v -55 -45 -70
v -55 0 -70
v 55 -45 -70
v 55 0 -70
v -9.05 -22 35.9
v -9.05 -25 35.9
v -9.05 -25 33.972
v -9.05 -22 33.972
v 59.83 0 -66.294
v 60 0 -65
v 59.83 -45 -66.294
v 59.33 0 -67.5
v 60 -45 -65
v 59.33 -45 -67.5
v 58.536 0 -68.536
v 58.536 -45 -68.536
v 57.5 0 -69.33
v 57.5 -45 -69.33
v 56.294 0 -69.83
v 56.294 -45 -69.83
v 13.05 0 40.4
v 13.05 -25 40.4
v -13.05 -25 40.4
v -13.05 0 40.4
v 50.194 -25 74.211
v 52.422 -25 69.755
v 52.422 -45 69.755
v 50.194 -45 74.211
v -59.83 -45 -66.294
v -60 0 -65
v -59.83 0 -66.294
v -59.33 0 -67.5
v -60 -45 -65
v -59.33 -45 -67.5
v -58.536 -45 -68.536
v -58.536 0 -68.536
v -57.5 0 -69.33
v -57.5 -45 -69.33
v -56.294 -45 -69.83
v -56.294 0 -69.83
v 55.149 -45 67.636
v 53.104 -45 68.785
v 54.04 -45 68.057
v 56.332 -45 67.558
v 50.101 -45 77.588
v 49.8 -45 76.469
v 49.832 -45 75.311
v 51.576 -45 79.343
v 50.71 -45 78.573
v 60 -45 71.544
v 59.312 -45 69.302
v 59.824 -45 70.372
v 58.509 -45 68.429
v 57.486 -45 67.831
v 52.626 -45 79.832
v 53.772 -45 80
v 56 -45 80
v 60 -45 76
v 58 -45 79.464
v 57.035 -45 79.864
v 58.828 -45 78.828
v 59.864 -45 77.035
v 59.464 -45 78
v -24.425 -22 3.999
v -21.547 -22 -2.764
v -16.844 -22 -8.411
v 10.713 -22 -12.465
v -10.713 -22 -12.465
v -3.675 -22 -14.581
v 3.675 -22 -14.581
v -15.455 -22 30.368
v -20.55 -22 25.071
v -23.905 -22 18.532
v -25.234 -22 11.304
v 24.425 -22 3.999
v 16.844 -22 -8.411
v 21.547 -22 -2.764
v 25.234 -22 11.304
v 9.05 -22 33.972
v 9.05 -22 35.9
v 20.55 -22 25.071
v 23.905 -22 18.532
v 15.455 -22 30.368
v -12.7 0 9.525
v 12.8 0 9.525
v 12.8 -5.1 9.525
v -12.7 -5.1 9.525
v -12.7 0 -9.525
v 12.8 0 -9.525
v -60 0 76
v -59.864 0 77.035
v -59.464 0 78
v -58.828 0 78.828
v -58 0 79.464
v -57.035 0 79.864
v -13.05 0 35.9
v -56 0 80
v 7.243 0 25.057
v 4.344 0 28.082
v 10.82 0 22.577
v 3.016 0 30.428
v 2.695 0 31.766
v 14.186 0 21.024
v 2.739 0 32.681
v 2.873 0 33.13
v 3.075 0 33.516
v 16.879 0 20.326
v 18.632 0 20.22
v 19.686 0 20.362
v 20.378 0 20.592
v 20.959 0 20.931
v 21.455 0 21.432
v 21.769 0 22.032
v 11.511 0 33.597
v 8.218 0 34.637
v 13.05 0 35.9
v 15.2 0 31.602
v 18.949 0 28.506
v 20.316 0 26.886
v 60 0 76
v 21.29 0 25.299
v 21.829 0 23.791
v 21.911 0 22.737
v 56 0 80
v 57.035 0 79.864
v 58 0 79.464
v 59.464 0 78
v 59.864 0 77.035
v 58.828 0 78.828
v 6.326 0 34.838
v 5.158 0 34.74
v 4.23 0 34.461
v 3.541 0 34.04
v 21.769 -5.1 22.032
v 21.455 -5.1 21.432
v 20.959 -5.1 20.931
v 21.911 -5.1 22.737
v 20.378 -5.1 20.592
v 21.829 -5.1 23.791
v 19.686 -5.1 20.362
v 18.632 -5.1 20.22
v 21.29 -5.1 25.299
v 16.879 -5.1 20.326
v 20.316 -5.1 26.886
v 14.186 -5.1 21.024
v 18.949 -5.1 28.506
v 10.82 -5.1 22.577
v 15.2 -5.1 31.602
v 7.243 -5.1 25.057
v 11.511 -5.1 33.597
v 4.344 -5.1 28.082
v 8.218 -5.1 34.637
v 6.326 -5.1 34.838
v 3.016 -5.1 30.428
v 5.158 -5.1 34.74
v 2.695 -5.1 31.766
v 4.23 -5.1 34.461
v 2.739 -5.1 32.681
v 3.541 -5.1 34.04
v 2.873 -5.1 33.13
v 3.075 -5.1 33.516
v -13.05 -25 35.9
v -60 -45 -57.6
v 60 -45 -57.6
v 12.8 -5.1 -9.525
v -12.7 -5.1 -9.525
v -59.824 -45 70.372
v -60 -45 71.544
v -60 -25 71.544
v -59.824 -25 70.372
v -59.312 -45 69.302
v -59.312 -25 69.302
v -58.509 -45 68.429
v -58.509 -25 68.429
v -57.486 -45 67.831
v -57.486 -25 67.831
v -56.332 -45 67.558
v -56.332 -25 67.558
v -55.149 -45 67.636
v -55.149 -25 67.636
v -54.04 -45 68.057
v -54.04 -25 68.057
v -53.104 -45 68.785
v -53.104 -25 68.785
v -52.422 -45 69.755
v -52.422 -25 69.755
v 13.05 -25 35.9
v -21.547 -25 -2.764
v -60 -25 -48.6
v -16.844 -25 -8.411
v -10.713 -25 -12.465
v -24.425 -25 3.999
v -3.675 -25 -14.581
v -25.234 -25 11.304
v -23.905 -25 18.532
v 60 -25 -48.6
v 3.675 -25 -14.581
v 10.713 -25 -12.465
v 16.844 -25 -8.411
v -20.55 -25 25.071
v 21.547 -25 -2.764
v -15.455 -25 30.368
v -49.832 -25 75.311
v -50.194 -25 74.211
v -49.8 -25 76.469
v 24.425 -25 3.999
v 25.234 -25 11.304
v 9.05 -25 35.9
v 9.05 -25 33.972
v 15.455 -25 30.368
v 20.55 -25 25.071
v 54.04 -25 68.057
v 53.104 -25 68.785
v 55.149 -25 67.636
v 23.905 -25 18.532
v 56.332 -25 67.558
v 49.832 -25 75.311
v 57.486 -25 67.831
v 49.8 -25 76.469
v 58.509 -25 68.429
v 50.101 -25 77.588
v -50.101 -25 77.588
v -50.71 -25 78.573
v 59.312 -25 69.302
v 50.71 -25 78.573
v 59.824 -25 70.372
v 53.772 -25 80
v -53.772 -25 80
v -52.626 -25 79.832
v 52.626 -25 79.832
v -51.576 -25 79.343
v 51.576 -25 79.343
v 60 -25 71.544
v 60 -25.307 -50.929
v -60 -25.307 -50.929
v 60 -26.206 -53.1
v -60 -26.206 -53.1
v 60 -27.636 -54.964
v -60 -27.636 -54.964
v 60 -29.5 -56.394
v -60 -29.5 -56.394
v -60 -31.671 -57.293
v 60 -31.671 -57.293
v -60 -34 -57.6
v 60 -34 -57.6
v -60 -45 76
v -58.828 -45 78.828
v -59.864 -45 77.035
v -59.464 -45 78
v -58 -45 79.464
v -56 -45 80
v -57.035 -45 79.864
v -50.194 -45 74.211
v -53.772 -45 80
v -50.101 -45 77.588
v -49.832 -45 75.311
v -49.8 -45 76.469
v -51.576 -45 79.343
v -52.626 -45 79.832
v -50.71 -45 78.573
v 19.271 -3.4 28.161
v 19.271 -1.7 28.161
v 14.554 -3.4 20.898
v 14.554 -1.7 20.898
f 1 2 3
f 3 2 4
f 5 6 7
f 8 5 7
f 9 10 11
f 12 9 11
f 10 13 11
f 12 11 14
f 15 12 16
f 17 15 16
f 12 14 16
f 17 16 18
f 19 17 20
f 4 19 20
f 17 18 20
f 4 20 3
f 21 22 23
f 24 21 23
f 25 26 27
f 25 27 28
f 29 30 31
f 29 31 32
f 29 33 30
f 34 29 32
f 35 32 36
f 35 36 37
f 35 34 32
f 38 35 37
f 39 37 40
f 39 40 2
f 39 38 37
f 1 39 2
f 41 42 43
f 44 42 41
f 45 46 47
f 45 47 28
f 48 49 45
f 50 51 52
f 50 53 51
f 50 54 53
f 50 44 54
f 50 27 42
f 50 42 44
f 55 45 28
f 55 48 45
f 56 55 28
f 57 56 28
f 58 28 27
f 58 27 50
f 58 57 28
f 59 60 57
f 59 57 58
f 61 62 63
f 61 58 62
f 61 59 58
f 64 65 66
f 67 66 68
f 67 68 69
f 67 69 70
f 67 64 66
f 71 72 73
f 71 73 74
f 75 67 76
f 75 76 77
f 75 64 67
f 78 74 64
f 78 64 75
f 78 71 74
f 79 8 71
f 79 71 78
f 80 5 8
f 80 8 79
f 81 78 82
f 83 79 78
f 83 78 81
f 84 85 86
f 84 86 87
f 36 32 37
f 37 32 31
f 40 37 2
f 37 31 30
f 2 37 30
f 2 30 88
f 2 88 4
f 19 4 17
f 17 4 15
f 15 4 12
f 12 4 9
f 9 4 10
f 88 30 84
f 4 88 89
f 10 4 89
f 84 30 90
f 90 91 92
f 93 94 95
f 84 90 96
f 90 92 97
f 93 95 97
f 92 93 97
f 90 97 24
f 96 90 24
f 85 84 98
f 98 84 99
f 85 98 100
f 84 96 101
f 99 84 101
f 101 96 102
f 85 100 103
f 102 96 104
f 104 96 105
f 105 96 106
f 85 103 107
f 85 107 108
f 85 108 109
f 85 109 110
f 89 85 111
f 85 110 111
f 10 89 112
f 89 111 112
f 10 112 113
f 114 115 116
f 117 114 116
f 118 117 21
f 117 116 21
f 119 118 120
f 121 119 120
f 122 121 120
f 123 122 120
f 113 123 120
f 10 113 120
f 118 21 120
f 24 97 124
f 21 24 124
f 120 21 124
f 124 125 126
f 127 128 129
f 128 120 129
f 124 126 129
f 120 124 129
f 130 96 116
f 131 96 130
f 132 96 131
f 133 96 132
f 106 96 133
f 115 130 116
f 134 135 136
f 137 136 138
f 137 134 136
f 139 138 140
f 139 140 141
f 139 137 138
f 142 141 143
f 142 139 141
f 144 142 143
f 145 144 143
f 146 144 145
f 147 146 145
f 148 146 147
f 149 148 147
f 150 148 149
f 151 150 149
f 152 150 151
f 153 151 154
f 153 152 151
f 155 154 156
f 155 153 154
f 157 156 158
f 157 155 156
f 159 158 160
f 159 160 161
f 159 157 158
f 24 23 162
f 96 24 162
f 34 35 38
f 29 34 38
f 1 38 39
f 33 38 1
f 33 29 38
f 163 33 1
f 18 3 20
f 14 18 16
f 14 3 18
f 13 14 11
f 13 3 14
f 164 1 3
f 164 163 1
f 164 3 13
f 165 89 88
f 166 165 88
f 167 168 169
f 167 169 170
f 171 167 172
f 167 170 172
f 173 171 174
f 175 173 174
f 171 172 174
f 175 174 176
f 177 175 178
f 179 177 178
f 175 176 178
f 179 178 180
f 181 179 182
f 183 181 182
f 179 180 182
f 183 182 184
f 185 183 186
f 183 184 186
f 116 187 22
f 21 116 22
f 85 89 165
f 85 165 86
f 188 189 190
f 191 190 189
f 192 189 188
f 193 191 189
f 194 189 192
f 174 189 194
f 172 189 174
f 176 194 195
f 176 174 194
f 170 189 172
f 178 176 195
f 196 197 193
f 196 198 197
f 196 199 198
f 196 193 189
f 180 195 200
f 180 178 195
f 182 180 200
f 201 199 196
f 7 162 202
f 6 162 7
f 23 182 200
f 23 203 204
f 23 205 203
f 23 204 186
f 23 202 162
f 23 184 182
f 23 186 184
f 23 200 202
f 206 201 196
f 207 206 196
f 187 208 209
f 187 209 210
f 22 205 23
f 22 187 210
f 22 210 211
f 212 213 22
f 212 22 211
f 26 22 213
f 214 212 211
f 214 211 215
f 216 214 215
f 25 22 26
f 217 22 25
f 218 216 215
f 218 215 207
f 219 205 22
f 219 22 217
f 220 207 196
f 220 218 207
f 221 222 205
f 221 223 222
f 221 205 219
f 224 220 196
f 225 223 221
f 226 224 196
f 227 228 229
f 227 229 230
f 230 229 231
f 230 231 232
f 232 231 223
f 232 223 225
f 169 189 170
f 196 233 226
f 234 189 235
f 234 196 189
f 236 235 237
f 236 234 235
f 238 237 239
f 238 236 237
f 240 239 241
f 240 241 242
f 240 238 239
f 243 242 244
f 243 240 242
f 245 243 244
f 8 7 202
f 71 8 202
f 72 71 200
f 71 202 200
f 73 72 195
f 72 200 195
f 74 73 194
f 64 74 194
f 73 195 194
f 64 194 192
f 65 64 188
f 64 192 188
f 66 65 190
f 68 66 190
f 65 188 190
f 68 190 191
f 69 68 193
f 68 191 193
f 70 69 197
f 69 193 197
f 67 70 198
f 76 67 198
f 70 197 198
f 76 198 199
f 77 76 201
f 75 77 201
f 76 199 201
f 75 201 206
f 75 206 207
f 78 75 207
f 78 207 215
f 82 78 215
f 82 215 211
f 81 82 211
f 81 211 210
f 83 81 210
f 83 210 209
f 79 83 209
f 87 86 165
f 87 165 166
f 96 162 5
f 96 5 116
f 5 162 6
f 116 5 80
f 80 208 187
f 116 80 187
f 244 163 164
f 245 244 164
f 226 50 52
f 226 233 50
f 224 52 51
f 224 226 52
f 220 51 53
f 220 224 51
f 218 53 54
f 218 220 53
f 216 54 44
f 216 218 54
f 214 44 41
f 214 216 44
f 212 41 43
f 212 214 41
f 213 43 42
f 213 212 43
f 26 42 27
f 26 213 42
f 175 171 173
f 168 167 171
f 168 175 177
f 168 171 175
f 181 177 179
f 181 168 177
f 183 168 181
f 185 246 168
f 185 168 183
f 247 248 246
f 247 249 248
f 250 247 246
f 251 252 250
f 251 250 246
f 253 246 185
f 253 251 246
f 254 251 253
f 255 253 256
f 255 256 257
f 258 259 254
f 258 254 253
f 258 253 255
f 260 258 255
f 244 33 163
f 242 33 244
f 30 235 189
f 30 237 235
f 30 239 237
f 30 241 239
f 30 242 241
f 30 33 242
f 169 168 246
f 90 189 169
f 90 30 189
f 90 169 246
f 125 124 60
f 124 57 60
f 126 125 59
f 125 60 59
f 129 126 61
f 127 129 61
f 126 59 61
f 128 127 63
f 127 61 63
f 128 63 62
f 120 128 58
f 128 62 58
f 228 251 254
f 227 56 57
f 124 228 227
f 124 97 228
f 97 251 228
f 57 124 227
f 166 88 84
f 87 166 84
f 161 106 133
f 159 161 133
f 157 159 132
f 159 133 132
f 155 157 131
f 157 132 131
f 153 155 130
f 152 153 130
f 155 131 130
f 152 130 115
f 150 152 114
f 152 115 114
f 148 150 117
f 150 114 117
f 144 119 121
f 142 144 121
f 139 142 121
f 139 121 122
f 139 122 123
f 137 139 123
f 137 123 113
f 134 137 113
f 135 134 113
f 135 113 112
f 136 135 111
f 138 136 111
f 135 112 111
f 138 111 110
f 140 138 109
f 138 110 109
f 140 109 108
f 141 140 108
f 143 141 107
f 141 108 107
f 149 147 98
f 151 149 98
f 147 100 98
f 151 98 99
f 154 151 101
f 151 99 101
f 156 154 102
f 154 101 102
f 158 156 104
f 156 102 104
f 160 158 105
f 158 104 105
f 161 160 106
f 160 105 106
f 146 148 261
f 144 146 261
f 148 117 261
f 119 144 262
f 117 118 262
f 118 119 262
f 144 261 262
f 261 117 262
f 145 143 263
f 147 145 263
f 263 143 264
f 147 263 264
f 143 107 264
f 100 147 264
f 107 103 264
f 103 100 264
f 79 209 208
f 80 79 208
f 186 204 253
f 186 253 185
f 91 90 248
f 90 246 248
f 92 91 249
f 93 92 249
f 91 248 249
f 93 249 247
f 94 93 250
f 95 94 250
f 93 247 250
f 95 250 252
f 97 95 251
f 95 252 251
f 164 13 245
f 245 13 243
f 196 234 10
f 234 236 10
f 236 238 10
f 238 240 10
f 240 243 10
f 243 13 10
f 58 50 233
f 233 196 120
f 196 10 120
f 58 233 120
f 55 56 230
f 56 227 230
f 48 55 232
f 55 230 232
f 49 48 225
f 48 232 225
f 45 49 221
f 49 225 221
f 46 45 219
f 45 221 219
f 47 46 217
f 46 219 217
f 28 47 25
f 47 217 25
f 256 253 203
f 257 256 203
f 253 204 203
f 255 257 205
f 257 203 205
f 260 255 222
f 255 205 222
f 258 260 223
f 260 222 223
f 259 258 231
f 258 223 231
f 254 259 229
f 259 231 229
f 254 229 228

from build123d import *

# Parameters (mm, degrees)
F0_W      = 120
F0_H      = 150
F1_DEPTH  = 45
F3_DEPTH  = 20
F4_R      = 9
F5_R      = 4
F6_R      = 5
F7_W      = 25.5
F7_H      = 19.05
F8_DEPTH  = 5.1
F10_DEPTH = 3
F12_DEPTH = 22.001


with BuildPart() as f1:
    # F0 (on Front) → F1 (new body)
    with BuildSketch(Plane.XZ):
        with Locations((0, 5)):
            Rectangle(F0_W, F0_H)
    extrude(amount=F1_DEPTH)

    # F2 (on face) → F3 (cut)
    with BuildSketch(Plane.XZ.offset(45)):
        Polygon((-60, -57.6), (60, -57.6), (60, 54.6), (47.3, 80), (-47.3, 80), (-60, 54.6), align=None)
    extrude(amount=-F3_DEPTH, mode=Mode.SUBTRACT)

    # F4
    f4_edges = [f1.edges().sort_by_distance(p)[0] for p in [
        (0, -25, -57.6),
    ]]
    fillet(f4_edges, radius=F4_R)

    # F5
    f5_edges = [f1.edges().sort_by_distance(p)[0] for p in [
        (60, -35, 54.6),
        (-60, -35, 54.6),
        (-47.3, -35, 80),
        (-60, -22.5, 80),
        (60, -22.5, 80),
        (47.3, -35, 80),
    ]]
    fillet(f5_edges, radius=F5_R)

    # F6
    f6_edges = [f1.edges().sort_by_distance(p)[0] for p in [
        (60, -22.5, -70),
        (-60, -22.5, -70),
    ]]
    fillet(f6_edges, radius=F6_R)

    # F7 (on face) → F8 (cut)
    with BuildSketch(Plane(origin=(0, 0, 0), x_dir=(-1, 0, 0), z_dir=(0, 1, 0))):
        with Locations((-0.05, 0)):
            Rectangle(F7_W, F7_H)
        with BuildLine():
            add(Edge.make_bspline(
                [(-3.074624, 33.516029), (-7.791336, 40.77913), (-19.271044, 28.161035), (-30.750752, 15.542941), (-14.554332, 20.897935), (1.642089, 26.252929), (-3.074624, 33.516029)],
                knots=[0, 0, 0, 2.094395, 2.094395, 4.18879, 4.18879, 6.283185, 6.283185, 6.283185], degree=2, weights=[1, 0.5, 1, 0.5, 1, 0.5, 1]))
        make_face()
    extrude(amount=-F8_DEPTH, mode=Mode.SUBTRACT)

    # F9 (on face) → F10 (cut)
    with BuildSketch(Plane.XZ.offset(25)):
        with BuildLine():
            Line((-9.05, 35.9), (-9.05, 33.972442))
            ThreePointArc((-9.05, 33.972442), (0, -14.85), (9.05, 33.972442))
            Line((9.05, 33.972442), (9.05, 35.9))
            Line((9.05, 35.9), (13.05, 35.9))
            Line((13.05, 35.9), (13.05, 40.4))
            Line((13.05, 40.4), (-13.05, 40.4))
            Line((-13.05, 40.4), (-13.05, 35.9))
            Line((-13.05, 35.9), (-9.05, 35.9))
        make_face()
    extrude(amount=-F10_DEPTH, mode=Mode.SUBTRACT)

    # F11 (on face) → F12 (cut, through all)
    with BuildSketch(Plane.XZ.offset(22)):
        Polygon((13.05, 40.4), (-13.05, 40.4), (-13.05, 35.9), (-9.05, 35.9), (9.05, 35.9), (13.05, 35.9), align=None)
    extrude(amount=-F12_DEPTH, mode=Mode.SUBTRACT)


solid = f1.part
